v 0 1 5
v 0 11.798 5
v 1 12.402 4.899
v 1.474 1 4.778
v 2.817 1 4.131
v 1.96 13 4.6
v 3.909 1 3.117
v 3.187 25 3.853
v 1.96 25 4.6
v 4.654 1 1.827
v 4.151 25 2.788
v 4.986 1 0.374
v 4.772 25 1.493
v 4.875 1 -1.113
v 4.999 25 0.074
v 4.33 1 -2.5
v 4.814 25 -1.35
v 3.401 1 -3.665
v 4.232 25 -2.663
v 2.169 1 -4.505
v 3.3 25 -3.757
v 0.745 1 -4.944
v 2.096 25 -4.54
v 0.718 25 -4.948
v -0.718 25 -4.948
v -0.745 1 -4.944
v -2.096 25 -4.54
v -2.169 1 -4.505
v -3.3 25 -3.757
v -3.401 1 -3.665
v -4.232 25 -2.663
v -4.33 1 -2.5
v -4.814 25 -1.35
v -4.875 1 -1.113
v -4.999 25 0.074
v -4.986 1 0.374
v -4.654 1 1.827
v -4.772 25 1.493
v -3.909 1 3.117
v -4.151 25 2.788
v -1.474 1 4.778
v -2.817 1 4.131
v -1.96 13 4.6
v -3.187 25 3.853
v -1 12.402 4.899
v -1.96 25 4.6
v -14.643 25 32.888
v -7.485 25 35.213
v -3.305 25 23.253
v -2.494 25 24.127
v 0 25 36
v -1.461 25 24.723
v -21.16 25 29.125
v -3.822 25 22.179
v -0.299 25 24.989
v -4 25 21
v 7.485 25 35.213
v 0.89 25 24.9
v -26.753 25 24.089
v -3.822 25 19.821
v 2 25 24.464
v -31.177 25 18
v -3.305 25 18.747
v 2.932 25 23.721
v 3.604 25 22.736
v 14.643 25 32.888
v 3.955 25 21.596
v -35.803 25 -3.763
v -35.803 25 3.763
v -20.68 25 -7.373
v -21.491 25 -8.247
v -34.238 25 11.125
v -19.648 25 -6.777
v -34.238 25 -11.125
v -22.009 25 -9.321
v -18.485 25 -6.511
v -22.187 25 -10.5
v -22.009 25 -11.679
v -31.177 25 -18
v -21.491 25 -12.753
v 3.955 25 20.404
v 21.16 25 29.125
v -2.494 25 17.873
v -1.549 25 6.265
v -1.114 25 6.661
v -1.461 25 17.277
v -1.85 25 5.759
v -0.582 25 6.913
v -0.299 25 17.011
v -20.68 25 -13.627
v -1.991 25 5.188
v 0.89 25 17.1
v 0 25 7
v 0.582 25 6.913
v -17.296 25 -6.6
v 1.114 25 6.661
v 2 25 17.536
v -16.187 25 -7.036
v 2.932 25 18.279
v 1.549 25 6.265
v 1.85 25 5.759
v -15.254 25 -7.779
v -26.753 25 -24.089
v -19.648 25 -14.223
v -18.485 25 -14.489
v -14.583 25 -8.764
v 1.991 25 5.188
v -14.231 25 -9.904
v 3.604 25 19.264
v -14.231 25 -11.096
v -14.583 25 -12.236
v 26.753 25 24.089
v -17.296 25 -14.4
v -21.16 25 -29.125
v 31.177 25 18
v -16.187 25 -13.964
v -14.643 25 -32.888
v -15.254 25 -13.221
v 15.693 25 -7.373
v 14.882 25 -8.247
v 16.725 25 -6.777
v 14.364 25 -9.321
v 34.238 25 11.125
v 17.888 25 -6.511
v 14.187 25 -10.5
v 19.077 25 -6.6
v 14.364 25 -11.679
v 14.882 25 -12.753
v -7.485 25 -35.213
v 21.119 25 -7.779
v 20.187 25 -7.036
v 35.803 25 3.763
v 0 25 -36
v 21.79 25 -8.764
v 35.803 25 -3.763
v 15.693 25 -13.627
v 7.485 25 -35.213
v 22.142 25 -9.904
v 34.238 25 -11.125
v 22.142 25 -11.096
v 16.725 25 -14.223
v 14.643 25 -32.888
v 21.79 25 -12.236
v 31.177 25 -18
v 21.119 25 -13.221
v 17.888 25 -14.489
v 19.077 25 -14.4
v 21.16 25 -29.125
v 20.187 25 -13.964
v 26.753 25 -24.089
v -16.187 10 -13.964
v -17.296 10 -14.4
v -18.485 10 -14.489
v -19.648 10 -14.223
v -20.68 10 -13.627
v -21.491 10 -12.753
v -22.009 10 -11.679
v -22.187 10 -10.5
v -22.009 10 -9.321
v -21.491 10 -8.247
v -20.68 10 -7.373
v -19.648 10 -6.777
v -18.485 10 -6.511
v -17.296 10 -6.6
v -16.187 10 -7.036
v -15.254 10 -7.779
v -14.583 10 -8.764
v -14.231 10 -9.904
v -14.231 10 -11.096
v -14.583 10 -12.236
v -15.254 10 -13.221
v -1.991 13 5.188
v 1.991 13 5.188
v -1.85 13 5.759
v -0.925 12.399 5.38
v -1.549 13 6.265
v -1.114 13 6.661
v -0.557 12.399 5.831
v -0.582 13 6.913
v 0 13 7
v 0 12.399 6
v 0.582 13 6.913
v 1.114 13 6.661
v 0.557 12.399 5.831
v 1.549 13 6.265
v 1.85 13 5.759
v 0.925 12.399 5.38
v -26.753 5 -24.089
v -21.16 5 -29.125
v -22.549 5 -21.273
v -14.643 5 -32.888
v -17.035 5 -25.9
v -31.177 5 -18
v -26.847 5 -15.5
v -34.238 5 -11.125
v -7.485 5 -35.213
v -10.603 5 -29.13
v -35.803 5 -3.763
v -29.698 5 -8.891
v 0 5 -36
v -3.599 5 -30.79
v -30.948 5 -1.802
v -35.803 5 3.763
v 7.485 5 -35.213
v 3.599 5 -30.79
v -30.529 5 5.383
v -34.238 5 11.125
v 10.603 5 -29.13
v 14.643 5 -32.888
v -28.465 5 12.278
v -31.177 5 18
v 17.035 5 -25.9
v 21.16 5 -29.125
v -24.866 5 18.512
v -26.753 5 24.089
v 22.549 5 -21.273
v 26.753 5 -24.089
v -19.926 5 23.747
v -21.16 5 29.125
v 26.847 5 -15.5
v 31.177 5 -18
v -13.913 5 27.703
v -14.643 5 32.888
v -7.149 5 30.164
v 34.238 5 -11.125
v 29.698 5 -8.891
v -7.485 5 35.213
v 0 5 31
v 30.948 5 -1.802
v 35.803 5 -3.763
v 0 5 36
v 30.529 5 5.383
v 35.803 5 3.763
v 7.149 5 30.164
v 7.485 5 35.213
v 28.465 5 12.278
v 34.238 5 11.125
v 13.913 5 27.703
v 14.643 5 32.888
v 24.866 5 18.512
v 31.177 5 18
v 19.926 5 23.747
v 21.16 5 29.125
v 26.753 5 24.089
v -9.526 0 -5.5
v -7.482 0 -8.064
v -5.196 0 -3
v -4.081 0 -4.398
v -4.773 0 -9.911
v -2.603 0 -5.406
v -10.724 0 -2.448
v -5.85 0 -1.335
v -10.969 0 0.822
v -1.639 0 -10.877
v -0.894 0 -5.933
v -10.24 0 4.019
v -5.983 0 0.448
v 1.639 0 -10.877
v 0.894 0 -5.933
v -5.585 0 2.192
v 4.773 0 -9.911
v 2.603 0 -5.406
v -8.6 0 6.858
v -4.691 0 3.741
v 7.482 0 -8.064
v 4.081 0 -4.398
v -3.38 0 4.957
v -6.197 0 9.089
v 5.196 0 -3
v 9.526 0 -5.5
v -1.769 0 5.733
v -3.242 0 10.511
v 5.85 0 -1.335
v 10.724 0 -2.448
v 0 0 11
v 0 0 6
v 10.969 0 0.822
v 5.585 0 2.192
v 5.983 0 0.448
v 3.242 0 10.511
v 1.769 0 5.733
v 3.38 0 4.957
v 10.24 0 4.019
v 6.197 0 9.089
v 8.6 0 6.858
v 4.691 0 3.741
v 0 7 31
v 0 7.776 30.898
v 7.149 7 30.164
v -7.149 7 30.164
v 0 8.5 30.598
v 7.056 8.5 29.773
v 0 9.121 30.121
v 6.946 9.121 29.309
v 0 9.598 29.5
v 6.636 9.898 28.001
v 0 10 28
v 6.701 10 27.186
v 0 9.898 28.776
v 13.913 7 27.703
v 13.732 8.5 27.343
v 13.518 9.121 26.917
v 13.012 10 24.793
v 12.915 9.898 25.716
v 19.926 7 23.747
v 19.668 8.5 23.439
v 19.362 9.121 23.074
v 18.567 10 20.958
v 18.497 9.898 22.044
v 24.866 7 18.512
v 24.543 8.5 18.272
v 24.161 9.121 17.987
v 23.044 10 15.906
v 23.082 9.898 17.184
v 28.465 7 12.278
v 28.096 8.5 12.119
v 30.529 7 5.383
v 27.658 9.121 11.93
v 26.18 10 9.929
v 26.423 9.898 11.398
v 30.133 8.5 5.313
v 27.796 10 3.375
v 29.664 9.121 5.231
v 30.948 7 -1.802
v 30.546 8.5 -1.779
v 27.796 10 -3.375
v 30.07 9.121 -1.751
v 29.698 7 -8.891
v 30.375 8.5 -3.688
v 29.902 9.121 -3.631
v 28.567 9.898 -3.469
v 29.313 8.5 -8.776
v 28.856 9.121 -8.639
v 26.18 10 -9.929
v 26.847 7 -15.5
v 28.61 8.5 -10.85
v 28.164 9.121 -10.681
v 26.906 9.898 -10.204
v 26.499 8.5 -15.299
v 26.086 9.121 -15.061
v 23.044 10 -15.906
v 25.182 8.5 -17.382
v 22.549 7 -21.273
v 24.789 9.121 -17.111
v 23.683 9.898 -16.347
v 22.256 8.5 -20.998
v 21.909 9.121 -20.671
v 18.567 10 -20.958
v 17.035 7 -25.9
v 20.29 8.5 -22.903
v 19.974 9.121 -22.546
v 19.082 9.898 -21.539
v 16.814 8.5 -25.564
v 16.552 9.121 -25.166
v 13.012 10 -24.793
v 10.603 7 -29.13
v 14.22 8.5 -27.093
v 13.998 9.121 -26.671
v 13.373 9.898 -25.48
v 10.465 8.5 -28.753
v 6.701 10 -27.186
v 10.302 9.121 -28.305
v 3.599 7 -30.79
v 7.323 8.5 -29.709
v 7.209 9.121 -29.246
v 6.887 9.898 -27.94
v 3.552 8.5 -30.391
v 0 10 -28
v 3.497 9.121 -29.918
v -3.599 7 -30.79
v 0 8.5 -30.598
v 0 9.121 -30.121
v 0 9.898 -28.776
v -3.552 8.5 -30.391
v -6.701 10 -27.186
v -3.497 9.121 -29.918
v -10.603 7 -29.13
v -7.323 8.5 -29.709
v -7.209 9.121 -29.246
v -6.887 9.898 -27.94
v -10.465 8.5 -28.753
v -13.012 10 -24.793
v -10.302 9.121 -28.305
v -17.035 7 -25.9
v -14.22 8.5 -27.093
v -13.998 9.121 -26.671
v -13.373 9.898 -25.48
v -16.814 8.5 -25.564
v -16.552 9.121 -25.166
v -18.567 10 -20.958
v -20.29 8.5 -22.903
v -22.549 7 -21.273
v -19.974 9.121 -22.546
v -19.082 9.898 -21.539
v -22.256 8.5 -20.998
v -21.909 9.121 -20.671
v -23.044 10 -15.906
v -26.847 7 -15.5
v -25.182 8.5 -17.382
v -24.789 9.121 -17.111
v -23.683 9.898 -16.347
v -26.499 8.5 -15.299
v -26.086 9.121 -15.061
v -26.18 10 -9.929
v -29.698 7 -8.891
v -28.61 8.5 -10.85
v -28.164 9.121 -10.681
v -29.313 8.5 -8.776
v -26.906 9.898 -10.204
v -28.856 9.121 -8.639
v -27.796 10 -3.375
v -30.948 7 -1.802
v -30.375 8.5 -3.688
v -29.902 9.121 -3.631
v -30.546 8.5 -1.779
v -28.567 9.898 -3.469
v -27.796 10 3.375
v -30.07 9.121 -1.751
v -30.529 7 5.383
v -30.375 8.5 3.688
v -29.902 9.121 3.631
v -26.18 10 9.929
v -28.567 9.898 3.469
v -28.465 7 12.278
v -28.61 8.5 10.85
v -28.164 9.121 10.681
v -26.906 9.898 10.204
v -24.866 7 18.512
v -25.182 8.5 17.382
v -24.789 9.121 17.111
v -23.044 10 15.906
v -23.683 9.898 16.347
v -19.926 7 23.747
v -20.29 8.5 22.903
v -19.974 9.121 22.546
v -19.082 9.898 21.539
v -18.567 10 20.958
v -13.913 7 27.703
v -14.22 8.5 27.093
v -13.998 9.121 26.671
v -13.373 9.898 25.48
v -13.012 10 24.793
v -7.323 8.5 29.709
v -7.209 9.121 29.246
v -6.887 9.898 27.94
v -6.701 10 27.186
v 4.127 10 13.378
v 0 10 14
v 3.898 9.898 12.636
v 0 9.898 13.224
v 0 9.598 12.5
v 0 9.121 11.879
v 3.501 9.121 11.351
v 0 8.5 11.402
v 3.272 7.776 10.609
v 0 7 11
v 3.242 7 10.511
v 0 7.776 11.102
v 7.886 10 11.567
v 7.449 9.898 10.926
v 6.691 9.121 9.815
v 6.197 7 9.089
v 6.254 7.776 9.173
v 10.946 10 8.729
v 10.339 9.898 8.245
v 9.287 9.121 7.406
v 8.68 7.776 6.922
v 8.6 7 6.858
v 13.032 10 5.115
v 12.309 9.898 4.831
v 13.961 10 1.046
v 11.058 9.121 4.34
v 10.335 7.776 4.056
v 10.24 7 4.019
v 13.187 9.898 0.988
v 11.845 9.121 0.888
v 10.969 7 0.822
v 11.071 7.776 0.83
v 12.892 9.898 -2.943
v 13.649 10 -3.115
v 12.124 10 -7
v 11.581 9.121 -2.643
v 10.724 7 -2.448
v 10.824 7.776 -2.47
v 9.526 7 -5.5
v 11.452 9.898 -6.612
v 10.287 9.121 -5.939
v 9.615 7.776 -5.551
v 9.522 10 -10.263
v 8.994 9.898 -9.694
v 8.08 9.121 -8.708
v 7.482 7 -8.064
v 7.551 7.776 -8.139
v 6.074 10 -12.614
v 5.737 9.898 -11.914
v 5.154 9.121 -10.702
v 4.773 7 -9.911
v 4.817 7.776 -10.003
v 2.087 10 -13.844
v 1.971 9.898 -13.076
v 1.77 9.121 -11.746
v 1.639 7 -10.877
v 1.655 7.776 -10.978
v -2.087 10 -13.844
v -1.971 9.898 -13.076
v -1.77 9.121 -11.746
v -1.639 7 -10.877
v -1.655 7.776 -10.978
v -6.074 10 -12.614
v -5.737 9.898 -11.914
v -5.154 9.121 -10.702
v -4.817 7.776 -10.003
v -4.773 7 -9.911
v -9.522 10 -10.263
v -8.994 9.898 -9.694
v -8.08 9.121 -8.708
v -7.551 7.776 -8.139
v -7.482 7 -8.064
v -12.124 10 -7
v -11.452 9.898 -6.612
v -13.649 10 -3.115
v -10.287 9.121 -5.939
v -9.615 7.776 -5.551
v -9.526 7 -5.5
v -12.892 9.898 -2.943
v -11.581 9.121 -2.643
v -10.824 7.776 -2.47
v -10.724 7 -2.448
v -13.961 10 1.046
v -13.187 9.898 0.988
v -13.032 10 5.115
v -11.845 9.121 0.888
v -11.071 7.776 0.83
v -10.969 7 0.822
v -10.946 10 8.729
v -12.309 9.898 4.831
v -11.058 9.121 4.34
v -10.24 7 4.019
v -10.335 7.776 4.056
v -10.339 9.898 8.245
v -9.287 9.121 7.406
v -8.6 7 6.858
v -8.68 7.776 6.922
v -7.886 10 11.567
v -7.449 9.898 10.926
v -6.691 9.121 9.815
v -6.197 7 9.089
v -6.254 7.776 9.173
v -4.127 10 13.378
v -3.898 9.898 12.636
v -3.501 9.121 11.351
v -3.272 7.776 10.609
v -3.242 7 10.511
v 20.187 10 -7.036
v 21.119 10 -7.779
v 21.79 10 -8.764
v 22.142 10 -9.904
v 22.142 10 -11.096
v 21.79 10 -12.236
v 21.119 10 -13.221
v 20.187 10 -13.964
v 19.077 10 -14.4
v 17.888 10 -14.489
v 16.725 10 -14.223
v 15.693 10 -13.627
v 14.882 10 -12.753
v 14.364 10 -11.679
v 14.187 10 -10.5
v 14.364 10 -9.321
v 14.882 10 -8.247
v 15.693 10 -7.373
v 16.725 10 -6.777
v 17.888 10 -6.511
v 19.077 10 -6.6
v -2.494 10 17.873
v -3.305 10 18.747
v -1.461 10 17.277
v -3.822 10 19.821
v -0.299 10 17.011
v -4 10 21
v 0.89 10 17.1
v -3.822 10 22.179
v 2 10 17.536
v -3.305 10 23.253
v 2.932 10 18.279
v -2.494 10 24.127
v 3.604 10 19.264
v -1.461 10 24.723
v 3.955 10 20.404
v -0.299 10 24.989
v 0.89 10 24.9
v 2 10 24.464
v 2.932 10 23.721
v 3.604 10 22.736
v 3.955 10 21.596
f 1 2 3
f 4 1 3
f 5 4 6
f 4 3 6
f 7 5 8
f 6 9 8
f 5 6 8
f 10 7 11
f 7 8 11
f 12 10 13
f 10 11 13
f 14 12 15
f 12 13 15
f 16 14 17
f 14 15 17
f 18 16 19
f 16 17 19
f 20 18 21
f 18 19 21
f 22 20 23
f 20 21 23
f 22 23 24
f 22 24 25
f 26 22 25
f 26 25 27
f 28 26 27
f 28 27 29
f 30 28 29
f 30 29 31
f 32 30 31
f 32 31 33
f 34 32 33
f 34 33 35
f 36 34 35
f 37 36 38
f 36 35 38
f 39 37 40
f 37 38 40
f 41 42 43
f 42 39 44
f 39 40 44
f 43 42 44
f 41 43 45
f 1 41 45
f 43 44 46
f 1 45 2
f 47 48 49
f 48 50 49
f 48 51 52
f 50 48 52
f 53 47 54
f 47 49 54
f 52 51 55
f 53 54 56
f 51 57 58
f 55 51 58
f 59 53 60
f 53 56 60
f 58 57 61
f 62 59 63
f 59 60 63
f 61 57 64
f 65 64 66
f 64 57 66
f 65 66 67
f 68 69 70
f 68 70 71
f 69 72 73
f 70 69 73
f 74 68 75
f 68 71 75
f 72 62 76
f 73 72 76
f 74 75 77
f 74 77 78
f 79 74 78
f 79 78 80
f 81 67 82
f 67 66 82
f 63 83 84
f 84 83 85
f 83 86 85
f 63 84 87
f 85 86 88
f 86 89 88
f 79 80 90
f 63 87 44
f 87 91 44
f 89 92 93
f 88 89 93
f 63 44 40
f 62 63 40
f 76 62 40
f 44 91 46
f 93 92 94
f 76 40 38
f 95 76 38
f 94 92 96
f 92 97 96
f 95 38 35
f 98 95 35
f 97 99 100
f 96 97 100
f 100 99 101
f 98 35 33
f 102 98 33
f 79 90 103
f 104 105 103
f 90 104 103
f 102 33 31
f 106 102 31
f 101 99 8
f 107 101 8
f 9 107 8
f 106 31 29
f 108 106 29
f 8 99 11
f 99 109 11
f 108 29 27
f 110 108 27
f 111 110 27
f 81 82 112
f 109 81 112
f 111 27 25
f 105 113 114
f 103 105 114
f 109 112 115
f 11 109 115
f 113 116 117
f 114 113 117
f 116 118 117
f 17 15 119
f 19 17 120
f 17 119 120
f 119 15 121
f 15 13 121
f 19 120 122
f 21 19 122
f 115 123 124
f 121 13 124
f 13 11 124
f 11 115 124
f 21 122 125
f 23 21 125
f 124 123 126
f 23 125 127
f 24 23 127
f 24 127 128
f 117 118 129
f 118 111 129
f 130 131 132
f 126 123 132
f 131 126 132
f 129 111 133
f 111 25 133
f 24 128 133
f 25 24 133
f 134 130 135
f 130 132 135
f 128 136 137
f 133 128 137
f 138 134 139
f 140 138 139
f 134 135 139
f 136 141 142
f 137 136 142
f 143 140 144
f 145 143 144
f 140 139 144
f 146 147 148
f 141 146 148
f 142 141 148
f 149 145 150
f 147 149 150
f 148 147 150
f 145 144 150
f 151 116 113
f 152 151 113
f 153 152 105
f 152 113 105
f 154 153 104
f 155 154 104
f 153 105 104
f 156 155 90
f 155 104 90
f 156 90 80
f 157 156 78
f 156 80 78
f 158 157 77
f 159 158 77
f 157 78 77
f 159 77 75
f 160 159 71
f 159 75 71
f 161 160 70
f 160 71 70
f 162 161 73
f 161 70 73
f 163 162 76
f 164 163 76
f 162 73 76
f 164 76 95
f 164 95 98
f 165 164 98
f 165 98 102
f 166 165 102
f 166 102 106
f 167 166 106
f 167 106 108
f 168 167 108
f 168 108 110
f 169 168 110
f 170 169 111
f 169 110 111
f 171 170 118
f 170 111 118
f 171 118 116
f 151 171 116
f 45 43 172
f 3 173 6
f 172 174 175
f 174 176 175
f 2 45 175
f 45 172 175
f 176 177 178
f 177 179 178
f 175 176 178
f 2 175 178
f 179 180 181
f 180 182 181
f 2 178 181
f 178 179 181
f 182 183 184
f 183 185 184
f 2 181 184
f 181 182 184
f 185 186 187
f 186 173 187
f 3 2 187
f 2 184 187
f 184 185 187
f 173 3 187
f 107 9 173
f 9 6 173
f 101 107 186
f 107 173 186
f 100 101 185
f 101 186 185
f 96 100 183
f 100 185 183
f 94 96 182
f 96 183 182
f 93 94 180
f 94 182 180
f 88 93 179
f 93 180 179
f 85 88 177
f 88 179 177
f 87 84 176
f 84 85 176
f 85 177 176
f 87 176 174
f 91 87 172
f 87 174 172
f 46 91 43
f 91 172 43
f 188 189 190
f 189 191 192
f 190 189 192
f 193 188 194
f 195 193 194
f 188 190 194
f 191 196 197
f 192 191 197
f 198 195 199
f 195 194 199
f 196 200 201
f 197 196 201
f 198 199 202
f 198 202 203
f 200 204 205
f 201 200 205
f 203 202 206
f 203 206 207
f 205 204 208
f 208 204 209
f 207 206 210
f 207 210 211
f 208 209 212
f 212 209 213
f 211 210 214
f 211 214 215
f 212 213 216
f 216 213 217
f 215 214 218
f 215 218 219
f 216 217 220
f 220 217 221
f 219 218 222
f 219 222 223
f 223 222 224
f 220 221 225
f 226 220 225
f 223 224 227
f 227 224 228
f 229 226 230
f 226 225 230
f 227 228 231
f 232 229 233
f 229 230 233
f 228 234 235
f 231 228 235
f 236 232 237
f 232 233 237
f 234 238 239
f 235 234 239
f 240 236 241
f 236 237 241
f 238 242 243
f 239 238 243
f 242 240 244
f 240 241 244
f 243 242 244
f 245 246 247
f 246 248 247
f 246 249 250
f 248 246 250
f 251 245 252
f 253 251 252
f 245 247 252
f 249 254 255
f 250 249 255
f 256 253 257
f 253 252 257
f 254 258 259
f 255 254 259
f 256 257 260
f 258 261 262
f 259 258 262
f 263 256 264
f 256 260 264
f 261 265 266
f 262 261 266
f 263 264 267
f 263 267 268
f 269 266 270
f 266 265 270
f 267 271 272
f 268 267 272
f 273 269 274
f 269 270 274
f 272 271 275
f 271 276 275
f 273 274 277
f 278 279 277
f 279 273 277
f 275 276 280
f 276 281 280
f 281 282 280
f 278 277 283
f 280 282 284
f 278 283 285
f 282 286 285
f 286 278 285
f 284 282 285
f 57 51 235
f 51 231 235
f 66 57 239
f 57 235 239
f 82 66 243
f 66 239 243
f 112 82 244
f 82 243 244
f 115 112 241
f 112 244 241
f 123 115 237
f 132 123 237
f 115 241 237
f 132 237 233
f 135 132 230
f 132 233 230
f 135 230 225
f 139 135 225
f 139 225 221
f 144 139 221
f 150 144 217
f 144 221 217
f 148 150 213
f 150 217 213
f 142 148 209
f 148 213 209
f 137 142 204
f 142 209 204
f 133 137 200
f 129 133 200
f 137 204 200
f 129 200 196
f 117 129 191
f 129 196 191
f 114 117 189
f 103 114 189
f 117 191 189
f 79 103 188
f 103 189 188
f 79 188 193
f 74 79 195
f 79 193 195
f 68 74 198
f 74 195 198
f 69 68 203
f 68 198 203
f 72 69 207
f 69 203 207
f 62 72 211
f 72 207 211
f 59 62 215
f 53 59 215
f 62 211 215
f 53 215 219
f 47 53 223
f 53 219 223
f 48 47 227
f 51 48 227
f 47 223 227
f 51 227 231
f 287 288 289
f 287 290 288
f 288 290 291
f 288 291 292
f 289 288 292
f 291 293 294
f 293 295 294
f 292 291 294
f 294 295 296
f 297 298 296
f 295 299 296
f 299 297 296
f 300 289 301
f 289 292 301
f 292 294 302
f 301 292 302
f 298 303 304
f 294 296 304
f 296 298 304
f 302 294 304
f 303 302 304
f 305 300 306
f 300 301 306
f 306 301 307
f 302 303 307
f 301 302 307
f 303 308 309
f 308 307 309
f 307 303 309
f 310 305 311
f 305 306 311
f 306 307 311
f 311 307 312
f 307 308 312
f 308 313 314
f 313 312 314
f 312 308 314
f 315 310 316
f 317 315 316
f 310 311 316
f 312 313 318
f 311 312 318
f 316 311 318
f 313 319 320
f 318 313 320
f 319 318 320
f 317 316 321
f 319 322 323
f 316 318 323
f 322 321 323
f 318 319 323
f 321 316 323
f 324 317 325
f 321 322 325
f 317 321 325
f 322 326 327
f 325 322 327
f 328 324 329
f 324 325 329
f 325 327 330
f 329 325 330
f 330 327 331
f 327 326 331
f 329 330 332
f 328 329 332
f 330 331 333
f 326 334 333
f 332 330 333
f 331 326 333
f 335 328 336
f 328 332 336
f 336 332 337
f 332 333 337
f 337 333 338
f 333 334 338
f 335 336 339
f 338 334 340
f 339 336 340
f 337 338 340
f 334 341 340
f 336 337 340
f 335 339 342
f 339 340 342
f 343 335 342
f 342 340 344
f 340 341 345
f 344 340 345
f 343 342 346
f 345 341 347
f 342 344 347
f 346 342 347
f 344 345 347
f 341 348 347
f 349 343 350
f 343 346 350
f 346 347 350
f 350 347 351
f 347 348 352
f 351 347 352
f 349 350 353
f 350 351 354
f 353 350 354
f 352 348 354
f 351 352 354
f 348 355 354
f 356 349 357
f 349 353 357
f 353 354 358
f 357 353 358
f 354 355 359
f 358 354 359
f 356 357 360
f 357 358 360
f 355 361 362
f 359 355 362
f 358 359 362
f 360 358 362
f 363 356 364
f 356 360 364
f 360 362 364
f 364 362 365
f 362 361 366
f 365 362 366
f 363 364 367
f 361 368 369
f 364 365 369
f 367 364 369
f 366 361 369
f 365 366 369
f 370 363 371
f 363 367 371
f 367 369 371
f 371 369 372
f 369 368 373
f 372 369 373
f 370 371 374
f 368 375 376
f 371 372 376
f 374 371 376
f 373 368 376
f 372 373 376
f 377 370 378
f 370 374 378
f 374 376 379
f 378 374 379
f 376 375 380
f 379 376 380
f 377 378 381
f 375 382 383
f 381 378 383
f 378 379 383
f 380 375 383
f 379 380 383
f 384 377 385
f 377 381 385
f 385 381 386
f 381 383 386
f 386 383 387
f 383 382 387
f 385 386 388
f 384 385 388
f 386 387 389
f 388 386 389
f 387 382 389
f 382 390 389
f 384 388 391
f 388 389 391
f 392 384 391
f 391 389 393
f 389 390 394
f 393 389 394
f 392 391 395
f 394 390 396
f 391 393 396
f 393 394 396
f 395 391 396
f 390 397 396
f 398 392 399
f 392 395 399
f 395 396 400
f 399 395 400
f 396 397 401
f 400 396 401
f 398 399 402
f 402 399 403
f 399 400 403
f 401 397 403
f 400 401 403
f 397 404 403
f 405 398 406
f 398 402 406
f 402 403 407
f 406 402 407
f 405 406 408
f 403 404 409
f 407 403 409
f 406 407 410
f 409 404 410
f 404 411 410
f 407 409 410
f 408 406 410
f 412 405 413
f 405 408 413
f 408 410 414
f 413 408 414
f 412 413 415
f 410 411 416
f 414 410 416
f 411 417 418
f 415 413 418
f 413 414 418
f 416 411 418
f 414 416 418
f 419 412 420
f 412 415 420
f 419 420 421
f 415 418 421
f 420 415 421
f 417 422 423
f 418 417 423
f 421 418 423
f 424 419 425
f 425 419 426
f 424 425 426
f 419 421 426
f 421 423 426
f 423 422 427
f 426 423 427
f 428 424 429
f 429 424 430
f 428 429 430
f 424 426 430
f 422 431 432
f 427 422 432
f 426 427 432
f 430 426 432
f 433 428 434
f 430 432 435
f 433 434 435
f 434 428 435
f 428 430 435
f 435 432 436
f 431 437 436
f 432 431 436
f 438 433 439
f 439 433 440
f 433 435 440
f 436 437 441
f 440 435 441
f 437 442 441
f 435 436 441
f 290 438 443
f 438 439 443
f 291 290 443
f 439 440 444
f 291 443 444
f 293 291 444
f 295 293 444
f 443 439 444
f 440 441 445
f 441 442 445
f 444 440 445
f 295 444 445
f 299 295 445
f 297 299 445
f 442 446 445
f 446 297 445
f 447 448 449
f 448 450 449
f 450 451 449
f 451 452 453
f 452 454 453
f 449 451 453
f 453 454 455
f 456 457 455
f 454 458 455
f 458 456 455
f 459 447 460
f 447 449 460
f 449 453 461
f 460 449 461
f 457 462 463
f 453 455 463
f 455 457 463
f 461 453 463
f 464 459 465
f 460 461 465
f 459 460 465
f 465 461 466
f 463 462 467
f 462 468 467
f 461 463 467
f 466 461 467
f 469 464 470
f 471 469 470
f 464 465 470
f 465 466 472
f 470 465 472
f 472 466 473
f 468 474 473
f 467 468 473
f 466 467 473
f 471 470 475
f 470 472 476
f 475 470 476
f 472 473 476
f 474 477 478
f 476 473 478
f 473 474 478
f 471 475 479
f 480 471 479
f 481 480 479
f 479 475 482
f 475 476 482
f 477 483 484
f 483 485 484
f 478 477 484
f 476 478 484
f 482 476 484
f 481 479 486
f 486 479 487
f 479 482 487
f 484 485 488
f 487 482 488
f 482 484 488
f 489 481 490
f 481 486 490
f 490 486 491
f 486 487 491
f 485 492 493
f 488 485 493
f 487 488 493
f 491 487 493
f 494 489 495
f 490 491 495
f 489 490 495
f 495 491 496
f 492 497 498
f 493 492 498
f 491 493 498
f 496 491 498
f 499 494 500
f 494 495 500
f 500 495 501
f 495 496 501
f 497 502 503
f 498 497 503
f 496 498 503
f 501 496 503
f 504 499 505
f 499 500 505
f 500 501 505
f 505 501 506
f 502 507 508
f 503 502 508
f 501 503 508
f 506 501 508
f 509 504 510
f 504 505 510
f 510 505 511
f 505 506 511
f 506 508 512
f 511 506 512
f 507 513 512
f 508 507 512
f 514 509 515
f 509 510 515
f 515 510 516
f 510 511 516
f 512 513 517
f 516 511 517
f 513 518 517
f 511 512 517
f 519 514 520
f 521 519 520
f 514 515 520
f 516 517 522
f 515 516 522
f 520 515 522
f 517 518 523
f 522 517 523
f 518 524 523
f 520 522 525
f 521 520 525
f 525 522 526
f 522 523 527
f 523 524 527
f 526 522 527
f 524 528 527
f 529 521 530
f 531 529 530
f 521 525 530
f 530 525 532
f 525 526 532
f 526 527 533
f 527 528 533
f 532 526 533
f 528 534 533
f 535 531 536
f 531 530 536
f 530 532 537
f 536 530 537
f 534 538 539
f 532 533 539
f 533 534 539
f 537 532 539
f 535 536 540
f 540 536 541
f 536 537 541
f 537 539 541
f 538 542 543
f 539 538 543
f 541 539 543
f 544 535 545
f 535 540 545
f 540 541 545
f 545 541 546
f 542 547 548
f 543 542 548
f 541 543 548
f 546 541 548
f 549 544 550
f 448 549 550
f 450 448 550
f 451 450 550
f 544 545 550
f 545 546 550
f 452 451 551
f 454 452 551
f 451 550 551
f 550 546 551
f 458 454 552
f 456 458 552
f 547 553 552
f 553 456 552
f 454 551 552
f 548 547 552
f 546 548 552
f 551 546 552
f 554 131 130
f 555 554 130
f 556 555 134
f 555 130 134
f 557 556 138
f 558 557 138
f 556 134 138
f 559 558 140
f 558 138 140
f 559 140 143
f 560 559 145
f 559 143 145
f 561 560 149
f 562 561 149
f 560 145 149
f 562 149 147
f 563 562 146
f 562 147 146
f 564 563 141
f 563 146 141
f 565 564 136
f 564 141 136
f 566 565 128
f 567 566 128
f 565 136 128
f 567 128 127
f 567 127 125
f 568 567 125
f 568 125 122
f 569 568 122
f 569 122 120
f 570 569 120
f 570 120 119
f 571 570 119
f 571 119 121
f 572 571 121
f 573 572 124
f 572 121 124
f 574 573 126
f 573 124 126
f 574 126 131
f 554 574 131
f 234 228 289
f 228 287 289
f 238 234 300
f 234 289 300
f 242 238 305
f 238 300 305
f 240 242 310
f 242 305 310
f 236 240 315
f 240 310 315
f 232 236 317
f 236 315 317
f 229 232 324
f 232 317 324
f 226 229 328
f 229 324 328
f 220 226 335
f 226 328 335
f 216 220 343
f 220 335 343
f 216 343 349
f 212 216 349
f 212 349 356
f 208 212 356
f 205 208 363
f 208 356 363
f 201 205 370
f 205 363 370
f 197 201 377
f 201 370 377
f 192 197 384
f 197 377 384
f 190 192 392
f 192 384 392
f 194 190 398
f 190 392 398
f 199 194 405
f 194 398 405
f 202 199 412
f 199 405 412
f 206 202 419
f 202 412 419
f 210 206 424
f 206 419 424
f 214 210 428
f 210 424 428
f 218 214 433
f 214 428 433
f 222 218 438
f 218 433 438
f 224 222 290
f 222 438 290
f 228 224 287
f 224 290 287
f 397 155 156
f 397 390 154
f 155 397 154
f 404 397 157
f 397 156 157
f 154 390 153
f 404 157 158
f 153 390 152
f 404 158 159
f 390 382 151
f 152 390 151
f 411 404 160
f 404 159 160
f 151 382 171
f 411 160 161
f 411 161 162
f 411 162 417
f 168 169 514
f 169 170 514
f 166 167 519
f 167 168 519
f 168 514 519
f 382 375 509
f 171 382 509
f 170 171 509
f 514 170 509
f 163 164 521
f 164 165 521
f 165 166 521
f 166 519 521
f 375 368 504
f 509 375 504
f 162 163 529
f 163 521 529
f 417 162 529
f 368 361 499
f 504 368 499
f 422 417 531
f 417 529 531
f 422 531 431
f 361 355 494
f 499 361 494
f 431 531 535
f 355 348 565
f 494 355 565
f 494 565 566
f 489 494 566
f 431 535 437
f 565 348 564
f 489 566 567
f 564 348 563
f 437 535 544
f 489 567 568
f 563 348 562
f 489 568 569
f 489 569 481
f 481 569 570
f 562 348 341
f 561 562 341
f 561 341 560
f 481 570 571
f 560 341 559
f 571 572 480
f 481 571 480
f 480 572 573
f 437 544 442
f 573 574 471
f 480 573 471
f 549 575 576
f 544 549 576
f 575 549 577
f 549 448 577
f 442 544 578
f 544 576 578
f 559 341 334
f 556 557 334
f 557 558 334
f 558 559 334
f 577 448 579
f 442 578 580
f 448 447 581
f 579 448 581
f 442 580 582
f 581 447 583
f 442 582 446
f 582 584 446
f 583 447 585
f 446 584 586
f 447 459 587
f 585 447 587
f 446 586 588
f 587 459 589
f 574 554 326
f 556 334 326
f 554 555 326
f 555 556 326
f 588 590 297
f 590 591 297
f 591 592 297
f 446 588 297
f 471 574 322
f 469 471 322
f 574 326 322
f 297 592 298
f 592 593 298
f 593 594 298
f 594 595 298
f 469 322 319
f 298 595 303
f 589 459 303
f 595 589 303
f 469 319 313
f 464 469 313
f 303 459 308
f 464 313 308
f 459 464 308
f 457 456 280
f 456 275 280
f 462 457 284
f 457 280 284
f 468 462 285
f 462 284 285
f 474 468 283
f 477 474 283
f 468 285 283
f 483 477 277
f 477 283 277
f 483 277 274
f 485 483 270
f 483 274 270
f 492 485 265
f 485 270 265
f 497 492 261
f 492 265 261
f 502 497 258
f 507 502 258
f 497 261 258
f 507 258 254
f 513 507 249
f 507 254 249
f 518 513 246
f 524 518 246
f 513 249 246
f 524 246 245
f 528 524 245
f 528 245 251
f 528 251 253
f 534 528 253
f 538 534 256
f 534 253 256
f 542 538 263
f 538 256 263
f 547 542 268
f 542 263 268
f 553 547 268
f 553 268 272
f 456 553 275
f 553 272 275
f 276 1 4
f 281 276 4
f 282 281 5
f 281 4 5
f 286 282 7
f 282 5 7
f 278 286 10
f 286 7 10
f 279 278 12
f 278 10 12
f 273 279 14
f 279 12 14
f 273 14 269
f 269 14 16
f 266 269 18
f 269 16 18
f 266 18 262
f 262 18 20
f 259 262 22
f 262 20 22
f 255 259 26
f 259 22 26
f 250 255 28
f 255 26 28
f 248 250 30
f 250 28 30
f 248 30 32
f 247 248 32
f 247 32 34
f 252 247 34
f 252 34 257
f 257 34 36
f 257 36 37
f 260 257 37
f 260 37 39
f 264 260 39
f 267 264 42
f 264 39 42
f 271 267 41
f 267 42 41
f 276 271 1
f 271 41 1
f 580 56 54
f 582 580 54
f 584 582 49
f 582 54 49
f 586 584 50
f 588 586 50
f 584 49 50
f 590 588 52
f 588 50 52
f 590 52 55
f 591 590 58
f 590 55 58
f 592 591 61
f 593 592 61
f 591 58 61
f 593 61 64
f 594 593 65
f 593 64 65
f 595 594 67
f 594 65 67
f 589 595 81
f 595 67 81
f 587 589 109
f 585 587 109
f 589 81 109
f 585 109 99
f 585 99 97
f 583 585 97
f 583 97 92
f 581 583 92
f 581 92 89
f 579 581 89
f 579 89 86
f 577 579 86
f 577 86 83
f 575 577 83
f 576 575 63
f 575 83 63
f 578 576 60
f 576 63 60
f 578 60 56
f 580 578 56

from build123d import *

# Parameters (mm, degrees)
F2_SIZE         = 1
F3_R            = 4
F4_DEPTH        = 15
F4_COPIES_COUNT = 3
F6_D            = 4
F6_DEPTH        = 12
F6_TIP          = 1.2017212381


# Not quite as in the source:
# - a pattern or mirror of a feature is missing from the dataset's text; its kind, count and spacing are read off the source's solid


with BuildPart() as f1:
    # F0 (on Right) → F1 (revolve)
    with BuildSketch(Plane.YZ):
        with BuildLine():
            Line((0, 11), (0, 5))
            Line((0, 5), (25, 5))
            Line((25, 5), (25, 36))
            Line((25, 36), (5, 36))
            Line((5, 36), (5, 31))
            Line((5, 31), (7, 31))
            ThreePointArc((7, 31), (9.1213203436, 30.1213203436), (10, 28))
            Line((10, 28), (10, 14))
            ThreePointArc((10, 14), (9.1213203436, 11.8786796564), (7, 11))
            Line((7, 11), (0, 11))
        make_face()
    revolve(axis=Axis((0, 9.0291841974, 0), (0, 1, 0)))

    # F2
    f2_edges = [f1.edges().sort_by_distance(p)[0] for p in [
        (0, 0, -5),
    ]]
    chamfer(f2_edges, length=F2_SIZE)

    # F3 (on face) → F4 (cut, through all)
    with BuildSketch(Plane(origin=(0, 25, 0), x_dir=(-1, 0, 0), z_dir=(0, 1, 0))):
        with Locations((0, 21)):
            Circle(F3_R)
    f4 = extrude(amount=-F4_DEPTH, mode=Mode.SUBTRACT)

    # F4_copies: F4 ×3 about axis
    f4_copies_axis = Axis((0, 0, 0), (0, 1, 0))
    for i in range(1, F4_COPIES_COUNT):
        add(f4.rotate(f4_copies_axis, i * 360 / F4_COPIES_COUNT), mode=Mode.SUBTRACT)

    # F6
    with Locations(Plane(origin=(0, 25, 0), x_dir=(-1, 0, 0), z_dir=(0, 1, 0))):
        with Locations((0, 5)):
            Hole(F6_D / 2, depth=F6_DEPTH)
            with Locations((0, 0, -(F6_DEPTH + F6_TIP / 2))):  # 118° drill point
                Cone(0, F6_D / 2, F6_TIP, mode=Mode.SUBTRACT)


solid = f1.part
